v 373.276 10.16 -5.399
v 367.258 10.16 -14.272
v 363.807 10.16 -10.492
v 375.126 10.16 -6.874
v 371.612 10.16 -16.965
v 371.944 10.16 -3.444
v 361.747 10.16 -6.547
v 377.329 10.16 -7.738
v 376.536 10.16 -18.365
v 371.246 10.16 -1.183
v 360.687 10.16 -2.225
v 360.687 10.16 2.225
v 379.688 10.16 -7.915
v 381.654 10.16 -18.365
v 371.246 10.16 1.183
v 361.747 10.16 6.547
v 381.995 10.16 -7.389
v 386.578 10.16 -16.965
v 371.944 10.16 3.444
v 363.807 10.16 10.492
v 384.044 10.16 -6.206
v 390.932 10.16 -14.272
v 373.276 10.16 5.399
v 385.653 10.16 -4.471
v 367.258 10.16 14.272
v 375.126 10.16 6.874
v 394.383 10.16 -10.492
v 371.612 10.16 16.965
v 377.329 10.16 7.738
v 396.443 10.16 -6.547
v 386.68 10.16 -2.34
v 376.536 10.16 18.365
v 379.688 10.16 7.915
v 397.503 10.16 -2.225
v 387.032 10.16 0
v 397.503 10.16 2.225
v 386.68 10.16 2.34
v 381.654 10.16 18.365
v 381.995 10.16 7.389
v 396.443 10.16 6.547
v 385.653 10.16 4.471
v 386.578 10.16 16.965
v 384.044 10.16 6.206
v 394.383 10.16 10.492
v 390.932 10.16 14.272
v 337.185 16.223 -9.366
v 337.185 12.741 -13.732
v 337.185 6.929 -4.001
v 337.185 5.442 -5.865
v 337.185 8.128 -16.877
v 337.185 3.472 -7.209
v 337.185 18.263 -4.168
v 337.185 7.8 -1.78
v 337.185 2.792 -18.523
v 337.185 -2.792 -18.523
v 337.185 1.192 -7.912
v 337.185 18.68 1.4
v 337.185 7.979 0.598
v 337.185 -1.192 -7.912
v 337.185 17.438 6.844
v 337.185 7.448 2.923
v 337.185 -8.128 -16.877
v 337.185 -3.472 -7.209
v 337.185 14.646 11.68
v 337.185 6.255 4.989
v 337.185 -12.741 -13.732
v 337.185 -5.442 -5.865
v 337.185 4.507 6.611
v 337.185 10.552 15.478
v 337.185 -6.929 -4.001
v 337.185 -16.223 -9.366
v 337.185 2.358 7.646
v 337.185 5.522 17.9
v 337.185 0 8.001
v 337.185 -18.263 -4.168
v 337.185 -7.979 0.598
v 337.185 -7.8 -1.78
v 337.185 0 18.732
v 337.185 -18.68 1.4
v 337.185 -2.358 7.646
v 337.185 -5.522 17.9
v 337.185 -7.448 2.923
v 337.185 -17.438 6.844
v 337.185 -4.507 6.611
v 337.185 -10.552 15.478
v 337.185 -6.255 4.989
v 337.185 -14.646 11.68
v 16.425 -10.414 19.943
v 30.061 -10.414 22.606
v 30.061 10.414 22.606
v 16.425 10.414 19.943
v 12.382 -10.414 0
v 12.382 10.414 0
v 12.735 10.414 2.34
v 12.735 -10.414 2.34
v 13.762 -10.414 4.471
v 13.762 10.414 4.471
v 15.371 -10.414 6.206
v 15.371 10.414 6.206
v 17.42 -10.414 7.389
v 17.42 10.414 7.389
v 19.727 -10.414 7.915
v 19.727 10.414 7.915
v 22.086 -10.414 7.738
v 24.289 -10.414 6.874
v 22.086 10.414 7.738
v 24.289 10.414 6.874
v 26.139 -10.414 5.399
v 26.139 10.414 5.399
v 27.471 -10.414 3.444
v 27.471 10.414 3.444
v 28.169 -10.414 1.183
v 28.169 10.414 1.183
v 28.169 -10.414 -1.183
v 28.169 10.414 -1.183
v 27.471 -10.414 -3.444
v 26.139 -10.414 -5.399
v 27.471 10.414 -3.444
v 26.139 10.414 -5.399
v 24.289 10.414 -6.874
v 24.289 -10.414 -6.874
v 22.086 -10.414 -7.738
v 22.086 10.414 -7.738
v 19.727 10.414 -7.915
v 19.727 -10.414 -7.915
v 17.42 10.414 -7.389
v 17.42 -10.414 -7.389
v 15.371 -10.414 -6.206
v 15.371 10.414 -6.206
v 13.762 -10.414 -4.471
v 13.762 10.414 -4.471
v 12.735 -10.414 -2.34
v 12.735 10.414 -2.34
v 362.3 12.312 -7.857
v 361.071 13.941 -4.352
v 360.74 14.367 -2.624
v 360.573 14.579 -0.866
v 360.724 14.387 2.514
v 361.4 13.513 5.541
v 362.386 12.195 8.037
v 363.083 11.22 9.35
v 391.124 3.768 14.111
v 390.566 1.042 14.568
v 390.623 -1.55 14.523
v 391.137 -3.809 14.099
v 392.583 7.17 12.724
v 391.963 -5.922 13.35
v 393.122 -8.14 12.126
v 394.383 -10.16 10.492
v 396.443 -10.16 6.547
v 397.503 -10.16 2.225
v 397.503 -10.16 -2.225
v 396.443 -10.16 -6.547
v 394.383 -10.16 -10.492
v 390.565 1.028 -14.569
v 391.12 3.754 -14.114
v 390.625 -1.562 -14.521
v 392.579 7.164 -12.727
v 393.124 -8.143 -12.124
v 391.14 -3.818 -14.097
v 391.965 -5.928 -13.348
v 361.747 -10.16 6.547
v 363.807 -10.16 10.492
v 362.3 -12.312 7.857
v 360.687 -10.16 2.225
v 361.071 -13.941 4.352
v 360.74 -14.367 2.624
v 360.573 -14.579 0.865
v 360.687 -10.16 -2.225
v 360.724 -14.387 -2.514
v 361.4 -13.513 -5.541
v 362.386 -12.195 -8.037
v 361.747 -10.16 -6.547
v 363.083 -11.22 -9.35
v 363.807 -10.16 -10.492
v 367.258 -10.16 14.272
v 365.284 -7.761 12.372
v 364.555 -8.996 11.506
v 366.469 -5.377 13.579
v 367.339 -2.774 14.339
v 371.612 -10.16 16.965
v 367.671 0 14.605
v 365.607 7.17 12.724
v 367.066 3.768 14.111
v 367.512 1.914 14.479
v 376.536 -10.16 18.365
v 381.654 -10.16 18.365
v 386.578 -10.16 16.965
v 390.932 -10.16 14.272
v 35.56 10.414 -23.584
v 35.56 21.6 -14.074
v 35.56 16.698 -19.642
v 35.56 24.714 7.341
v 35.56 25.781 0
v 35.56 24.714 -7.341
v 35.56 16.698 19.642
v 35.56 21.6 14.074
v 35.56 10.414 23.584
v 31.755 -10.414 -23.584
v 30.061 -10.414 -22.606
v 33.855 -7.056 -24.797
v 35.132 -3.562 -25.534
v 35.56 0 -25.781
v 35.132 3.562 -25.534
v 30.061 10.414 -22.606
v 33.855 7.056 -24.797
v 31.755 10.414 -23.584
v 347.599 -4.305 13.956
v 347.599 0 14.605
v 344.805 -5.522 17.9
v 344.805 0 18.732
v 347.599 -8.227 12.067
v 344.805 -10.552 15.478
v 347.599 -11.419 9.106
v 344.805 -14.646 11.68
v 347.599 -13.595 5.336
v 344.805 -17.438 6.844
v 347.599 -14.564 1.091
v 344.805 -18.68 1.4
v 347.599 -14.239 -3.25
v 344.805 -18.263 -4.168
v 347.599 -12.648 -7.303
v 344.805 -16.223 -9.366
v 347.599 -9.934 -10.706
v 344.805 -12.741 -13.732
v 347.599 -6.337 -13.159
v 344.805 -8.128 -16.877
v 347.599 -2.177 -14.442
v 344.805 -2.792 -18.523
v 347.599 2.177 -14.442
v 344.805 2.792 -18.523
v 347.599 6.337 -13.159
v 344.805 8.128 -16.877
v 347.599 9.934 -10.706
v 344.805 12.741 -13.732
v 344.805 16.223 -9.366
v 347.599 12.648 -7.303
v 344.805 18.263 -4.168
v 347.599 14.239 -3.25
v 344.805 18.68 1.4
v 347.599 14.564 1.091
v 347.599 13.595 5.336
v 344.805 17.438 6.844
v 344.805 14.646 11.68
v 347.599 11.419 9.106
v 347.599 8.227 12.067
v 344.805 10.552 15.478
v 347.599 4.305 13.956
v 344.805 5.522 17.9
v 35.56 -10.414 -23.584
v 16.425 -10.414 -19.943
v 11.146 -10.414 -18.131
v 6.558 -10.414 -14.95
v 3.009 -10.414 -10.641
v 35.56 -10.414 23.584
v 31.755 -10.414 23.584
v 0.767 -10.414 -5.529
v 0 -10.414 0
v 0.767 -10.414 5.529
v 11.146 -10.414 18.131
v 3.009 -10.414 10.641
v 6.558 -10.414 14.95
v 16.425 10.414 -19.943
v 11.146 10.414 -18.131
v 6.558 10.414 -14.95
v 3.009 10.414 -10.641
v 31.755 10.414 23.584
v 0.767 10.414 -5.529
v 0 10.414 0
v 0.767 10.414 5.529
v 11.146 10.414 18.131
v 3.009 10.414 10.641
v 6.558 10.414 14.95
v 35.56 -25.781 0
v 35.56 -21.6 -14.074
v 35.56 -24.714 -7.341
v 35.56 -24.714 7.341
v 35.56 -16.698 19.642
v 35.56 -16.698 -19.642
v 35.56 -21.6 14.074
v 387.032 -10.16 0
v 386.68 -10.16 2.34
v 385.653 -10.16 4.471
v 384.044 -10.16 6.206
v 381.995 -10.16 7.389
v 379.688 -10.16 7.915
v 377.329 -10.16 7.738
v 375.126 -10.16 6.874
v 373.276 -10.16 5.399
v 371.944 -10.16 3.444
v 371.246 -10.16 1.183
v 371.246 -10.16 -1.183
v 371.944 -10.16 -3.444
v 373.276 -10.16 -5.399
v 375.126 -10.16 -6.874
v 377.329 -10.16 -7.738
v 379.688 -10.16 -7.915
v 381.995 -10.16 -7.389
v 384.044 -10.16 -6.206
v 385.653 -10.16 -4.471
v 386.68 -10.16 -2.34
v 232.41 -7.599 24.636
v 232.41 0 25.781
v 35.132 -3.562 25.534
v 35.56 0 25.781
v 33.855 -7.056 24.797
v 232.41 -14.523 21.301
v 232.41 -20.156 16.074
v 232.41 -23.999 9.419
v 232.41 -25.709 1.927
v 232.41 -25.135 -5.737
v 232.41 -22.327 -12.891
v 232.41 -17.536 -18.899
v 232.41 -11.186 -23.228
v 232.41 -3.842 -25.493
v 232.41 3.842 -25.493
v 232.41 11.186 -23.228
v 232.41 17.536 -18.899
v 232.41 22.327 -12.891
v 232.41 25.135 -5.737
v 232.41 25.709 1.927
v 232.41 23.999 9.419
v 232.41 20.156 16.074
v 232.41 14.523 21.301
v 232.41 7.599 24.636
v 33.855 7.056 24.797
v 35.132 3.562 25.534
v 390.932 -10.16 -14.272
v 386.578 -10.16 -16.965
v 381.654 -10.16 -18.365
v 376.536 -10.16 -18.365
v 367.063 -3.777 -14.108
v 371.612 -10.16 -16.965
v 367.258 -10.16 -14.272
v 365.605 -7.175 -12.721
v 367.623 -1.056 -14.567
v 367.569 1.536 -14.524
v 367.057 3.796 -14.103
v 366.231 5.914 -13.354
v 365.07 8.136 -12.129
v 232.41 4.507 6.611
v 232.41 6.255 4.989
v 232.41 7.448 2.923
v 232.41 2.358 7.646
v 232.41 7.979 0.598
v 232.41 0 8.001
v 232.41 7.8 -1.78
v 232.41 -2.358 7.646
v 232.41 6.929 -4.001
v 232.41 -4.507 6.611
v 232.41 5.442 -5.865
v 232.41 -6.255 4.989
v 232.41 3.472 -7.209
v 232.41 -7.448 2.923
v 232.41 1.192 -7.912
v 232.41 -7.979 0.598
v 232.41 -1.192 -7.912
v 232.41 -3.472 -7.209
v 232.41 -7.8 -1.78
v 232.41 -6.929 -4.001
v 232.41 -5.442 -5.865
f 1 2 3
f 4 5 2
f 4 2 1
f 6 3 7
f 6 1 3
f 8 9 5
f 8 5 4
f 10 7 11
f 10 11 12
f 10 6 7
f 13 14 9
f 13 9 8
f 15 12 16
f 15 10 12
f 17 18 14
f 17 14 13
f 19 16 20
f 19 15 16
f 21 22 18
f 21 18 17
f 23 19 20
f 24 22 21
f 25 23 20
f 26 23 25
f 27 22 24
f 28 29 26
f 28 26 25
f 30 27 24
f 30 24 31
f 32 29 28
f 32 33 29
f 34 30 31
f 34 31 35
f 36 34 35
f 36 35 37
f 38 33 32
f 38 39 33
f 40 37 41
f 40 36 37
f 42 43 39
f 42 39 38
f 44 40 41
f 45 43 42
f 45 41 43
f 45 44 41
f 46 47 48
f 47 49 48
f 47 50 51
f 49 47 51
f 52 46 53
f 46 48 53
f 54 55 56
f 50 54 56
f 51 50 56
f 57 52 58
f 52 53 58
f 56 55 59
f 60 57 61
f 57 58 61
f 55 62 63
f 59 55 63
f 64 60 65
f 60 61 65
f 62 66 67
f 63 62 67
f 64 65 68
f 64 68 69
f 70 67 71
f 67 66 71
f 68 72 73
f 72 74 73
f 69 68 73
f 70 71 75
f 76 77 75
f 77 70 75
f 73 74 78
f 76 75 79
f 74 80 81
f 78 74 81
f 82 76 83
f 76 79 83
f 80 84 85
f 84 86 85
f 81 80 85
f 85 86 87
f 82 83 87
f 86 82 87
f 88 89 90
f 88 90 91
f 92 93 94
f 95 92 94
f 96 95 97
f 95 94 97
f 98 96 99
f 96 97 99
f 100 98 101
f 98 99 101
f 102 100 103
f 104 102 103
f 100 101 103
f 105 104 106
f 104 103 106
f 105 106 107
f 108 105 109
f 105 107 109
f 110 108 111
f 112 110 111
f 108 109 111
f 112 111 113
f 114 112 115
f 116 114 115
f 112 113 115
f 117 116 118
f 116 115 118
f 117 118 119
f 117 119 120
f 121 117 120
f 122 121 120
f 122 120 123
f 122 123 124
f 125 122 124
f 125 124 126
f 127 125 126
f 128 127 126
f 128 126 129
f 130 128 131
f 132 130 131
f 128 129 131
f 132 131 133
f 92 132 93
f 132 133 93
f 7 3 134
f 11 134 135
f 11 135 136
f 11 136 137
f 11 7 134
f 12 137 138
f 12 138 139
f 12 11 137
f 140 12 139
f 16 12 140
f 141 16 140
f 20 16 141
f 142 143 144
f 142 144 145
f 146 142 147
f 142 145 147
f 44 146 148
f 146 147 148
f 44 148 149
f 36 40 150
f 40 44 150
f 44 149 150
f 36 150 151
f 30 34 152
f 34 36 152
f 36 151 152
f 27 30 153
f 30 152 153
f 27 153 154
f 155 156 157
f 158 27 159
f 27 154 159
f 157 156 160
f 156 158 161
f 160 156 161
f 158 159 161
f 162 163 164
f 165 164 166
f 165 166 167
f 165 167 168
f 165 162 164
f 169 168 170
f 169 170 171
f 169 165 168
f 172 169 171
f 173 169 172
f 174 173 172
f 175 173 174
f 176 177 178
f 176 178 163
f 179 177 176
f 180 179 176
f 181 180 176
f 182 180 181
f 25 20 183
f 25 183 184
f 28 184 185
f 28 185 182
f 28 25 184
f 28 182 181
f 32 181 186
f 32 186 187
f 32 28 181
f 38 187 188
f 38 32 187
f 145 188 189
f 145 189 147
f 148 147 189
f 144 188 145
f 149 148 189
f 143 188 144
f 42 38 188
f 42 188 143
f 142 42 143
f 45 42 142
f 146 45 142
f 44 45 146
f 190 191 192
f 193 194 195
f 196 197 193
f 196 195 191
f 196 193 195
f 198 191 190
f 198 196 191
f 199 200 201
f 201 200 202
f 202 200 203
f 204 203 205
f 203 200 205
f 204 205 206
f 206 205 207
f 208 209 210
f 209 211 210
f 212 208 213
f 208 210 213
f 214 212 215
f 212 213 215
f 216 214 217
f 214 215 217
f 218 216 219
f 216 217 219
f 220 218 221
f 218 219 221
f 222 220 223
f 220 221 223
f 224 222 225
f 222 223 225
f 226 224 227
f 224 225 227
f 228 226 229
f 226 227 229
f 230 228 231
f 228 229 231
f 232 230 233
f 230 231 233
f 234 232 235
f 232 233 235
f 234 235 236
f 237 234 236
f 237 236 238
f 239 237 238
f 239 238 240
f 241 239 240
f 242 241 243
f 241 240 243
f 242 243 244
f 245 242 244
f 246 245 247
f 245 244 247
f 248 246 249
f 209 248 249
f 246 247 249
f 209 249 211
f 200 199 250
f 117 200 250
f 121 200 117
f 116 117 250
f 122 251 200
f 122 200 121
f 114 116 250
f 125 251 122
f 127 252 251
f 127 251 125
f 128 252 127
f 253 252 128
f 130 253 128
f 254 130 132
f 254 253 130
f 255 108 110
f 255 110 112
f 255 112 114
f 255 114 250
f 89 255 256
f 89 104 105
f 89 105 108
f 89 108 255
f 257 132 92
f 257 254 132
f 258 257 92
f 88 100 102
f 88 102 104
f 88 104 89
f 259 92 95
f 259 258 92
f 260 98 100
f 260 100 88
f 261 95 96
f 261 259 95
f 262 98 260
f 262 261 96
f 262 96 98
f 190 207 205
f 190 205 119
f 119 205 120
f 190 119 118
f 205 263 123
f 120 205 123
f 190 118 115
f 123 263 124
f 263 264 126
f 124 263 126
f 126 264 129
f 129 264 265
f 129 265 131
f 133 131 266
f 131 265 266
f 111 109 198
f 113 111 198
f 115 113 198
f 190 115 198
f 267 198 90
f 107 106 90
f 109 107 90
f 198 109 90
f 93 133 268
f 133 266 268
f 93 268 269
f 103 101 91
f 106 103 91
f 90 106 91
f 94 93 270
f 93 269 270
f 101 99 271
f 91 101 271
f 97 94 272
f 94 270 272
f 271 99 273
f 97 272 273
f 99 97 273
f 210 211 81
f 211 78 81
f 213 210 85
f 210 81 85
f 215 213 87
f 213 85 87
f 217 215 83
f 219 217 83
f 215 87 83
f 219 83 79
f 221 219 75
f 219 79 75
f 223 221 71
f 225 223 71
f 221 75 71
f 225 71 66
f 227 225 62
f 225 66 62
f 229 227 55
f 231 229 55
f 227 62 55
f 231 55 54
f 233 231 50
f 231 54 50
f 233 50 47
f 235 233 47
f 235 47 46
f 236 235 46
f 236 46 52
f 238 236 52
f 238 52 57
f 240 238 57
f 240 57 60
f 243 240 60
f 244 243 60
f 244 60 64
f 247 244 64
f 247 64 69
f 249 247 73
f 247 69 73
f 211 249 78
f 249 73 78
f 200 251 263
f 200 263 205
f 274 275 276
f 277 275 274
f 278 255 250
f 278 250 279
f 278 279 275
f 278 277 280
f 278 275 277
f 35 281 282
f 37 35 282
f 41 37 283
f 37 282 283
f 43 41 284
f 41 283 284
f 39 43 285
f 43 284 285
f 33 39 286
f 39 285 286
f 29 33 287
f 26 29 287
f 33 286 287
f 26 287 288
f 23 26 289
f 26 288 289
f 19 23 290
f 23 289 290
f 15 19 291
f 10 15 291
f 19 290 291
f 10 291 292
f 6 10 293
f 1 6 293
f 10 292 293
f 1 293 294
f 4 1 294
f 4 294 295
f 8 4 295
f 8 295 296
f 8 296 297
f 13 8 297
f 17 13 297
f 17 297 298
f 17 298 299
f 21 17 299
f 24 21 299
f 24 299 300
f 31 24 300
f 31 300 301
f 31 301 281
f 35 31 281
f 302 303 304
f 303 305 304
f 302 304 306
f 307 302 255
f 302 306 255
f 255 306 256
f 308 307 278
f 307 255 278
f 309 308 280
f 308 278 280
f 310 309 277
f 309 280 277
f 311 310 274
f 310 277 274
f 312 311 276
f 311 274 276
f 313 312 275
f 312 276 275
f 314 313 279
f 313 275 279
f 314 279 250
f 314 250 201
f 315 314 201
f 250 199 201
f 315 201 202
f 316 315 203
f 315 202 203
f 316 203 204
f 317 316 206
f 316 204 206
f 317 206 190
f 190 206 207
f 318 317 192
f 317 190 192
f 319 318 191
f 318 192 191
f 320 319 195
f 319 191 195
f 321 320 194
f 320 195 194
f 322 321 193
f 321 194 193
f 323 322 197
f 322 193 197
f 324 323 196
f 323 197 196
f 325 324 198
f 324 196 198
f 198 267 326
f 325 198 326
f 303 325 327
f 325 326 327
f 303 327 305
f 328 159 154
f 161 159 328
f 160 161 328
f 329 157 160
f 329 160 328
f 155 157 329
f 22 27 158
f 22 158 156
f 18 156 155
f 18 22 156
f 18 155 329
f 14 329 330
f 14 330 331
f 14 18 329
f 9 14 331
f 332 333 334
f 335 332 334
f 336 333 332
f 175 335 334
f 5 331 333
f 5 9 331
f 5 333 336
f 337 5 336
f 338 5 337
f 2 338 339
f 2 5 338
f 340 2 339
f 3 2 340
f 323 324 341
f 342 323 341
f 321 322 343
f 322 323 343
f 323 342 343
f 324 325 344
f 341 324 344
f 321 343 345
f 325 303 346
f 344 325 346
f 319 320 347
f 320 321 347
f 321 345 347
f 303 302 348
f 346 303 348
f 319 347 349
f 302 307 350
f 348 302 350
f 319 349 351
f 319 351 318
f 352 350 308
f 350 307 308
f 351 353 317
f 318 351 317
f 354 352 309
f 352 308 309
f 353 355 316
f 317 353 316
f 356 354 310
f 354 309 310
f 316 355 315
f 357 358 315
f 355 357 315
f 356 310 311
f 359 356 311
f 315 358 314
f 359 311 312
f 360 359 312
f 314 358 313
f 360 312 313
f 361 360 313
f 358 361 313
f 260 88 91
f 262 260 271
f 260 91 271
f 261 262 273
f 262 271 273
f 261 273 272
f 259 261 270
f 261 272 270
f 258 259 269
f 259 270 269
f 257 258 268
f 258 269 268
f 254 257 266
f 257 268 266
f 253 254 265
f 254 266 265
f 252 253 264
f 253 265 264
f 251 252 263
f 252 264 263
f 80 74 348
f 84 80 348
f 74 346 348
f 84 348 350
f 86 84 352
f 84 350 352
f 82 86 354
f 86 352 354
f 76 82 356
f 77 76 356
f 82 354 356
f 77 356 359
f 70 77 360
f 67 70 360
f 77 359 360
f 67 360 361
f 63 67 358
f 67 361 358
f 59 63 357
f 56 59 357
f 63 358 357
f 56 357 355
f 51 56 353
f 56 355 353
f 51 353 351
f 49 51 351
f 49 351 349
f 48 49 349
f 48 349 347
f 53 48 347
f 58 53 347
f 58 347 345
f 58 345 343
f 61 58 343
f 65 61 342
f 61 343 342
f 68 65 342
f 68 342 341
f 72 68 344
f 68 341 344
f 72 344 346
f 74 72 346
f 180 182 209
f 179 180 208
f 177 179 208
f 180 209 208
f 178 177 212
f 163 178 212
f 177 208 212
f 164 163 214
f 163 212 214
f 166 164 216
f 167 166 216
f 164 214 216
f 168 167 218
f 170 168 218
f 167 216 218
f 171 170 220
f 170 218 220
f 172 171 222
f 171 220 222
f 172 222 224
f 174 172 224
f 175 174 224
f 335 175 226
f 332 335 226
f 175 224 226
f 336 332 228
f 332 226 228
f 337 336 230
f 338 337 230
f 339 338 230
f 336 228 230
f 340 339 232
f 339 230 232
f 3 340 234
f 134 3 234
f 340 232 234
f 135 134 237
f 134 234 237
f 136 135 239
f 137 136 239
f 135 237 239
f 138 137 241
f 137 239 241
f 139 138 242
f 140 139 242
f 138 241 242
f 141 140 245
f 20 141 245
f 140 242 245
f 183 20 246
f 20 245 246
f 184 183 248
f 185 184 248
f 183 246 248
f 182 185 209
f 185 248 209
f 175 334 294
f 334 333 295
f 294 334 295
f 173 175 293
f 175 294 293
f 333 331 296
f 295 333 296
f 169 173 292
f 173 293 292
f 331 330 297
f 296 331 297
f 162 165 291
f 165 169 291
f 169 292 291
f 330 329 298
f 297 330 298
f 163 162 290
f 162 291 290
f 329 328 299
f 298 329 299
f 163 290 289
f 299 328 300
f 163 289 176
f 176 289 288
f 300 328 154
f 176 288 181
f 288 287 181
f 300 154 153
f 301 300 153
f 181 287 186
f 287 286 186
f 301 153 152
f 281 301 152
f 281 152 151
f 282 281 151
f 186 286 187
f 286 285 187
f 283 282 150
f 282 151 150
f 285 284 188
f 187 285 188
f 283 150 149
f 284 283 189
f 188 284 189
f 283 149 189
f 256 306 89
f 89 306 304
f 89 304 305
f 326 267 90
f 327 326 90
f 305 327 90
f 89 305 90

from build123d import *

# Parameters (mm, degrees)
F2_W      = 38.1
F2_H      = 63.5
F3_DEPTH  = 35.56
F4_R      = 7.9375
F5_DEPTH  = 20.828
F6_W      = 25.4
F6_H      = 25.4
F7_DEPTH  = 44.704
F8_R      = 18.542
F9_DEPTH  = 20.32
F11_DEPTH = 12.7
F13_DEPTH = 25.4
F15_DEPTH = 25.4
F16_R     = 7.9375
F17_DEPTH = 35.942


with BuildPart() as f1:
    # F0 (on Front) → F1 (revolve)
    with BuildSketch(Plane.XZ):
        Polygon((232.41, 25.781), (0, 25.781), (0, 0), (409.829, 0), (409.829, 14.605), (347.599, 14.605), (344.805, 18.7325), (337.185, 18.7325), (337.185, 8.001), (232.41, 8.001), align=None)
    revolve(axis=Axis((144.6166912608, 0, 0), (1, 0, 0)))

    # F2 (on face) → F3 (cut)
    with BuildSketch(Plane(origin=(0, 0, 0), x_dir=(0, -1, 0), z_dir=(-1, 0, 0))):
        with Locations((29.464, 0)):
            Rectangle(F2_W, F2_H)
        with Locations((-29.464, 0)):
            Rectangle(F2_W, F2_H)
    extrude(amount=-F3_DEPTH, mode=Mode.SUBTRACT)

    # F4 (on face) → F5 (cut, through all)
    with BuildSketch(Plane(origin=(0, 10.414, 0), x_dir=(-1, 0, 0), z_dir=(0, 1, 0))):
        with BuildLine():
            Line((10.16, 25.781), (-35.56, 25.781))
            Line((-35.56, 25.781), (-30.060738686, 22.606))
            Line((-30.060738686, 22.606), (-16.4254601504, 19.9432935936))
            ThreePointArc((-16.4254601504, 19.9432935936), (0, 0), (-16.4254601504, -19.9432935936))
            Line((-16.4254601504, -19.9432935936), (-30.060738686, -22.606))
            Line((-30.060738686, -22.606), (-35.56, -25.781))
            Line((-35.56, -25.781), (10.16, -25.781))
            Line((10.16, -25.781), (10.16, 25.781))
        make_face()
        with Locations((-20.32, 0)):
            Circle(F4_R)
    extrude(amount=-F5_DEPTH, mode=Mode.SUBTRACT)

    # F6 (on face) → F7 (cut)
    with BuildSketch(Plane.YZ.offset(409.829)):
        with Locations((22.86, 0)):
            Rectangle(F6_W, F6_H)
        with Locations((-22.86, 0)):
            Rectangle(F6_W, F6_H)
    extrude(amount=-F7_DEPTH, mode=Mode.SUBTRACT)

    # F8 (on face) → F9 (join, through all)
    with BuildSketch(Plane(origin=(0, 10.16, 0), x_dir=(-1, 0, 0), z_dir=(0, 1, 0))):
        with Locations((-379.095, 0)):
            Circle(F8_R)
    extrude(amount=-F9_DEPTH)

    # F10 (on Front) → F11 (cut, symmetric)
    with BuildSketch(Plane.XZ):
        with BuildLine():
            Line((409.829, 14.605), (390.5186482351, 14.605))
            ThreePointArc((390.5186482351, 14.605), (397.637, 0), (390.5186482351, -14.605))
            Line((390.5186482351, -14.605), (409.829, -14.605))
            Line((409.829, -14.605), (409.829, 14.605))
        make_face()
    extrude(amount=F11_DEPTH, both=True, mode=Mode.SUBTRACT)

    # F12 (on face) → F13 (cut)
    with BuildSketch(Plane(origin=(0, 10.16, 0), x_dir=(-1, 0, 0), z_dir=(0, 1, 0))):
        with BuildLine():
            ThreePointArc((-365.5518286226, -12.6644491804), (-360.553, 0), (-365.5518286226, 12.6644491804))
            Line((-365.5518286226, 12.6644491804), (-365.5518286226, -12.6644491804))
        make_face()
    extrude(amount=F13_DEPTH, mode=Mode.SUBTRACT)

    # F14 (on face) → F15 (cut)
    with BuildSketch(Plane.XZ.offset(10.16)):
        with BuildLine():
            Line((365.125, -12.192), (365.125, 12.192))
            ThreePointArc((365.125, 12.192), (360.553, 0), (365.125, -12.192))
        make_face()
    extrude(amount=F15_DEPTH, mode=Mode.SUBTRACT)

    # F16 (on face) → F17 (cut, through all)
    with BuildSketch(Plane.XZ.offset(10.16)):
        with Locations((379.095, 0)):
            Circle(F16_R)
    extrude(amount=-F17_DEPTH, mode=Mode.SUBTRACT)


solid = f1.part
